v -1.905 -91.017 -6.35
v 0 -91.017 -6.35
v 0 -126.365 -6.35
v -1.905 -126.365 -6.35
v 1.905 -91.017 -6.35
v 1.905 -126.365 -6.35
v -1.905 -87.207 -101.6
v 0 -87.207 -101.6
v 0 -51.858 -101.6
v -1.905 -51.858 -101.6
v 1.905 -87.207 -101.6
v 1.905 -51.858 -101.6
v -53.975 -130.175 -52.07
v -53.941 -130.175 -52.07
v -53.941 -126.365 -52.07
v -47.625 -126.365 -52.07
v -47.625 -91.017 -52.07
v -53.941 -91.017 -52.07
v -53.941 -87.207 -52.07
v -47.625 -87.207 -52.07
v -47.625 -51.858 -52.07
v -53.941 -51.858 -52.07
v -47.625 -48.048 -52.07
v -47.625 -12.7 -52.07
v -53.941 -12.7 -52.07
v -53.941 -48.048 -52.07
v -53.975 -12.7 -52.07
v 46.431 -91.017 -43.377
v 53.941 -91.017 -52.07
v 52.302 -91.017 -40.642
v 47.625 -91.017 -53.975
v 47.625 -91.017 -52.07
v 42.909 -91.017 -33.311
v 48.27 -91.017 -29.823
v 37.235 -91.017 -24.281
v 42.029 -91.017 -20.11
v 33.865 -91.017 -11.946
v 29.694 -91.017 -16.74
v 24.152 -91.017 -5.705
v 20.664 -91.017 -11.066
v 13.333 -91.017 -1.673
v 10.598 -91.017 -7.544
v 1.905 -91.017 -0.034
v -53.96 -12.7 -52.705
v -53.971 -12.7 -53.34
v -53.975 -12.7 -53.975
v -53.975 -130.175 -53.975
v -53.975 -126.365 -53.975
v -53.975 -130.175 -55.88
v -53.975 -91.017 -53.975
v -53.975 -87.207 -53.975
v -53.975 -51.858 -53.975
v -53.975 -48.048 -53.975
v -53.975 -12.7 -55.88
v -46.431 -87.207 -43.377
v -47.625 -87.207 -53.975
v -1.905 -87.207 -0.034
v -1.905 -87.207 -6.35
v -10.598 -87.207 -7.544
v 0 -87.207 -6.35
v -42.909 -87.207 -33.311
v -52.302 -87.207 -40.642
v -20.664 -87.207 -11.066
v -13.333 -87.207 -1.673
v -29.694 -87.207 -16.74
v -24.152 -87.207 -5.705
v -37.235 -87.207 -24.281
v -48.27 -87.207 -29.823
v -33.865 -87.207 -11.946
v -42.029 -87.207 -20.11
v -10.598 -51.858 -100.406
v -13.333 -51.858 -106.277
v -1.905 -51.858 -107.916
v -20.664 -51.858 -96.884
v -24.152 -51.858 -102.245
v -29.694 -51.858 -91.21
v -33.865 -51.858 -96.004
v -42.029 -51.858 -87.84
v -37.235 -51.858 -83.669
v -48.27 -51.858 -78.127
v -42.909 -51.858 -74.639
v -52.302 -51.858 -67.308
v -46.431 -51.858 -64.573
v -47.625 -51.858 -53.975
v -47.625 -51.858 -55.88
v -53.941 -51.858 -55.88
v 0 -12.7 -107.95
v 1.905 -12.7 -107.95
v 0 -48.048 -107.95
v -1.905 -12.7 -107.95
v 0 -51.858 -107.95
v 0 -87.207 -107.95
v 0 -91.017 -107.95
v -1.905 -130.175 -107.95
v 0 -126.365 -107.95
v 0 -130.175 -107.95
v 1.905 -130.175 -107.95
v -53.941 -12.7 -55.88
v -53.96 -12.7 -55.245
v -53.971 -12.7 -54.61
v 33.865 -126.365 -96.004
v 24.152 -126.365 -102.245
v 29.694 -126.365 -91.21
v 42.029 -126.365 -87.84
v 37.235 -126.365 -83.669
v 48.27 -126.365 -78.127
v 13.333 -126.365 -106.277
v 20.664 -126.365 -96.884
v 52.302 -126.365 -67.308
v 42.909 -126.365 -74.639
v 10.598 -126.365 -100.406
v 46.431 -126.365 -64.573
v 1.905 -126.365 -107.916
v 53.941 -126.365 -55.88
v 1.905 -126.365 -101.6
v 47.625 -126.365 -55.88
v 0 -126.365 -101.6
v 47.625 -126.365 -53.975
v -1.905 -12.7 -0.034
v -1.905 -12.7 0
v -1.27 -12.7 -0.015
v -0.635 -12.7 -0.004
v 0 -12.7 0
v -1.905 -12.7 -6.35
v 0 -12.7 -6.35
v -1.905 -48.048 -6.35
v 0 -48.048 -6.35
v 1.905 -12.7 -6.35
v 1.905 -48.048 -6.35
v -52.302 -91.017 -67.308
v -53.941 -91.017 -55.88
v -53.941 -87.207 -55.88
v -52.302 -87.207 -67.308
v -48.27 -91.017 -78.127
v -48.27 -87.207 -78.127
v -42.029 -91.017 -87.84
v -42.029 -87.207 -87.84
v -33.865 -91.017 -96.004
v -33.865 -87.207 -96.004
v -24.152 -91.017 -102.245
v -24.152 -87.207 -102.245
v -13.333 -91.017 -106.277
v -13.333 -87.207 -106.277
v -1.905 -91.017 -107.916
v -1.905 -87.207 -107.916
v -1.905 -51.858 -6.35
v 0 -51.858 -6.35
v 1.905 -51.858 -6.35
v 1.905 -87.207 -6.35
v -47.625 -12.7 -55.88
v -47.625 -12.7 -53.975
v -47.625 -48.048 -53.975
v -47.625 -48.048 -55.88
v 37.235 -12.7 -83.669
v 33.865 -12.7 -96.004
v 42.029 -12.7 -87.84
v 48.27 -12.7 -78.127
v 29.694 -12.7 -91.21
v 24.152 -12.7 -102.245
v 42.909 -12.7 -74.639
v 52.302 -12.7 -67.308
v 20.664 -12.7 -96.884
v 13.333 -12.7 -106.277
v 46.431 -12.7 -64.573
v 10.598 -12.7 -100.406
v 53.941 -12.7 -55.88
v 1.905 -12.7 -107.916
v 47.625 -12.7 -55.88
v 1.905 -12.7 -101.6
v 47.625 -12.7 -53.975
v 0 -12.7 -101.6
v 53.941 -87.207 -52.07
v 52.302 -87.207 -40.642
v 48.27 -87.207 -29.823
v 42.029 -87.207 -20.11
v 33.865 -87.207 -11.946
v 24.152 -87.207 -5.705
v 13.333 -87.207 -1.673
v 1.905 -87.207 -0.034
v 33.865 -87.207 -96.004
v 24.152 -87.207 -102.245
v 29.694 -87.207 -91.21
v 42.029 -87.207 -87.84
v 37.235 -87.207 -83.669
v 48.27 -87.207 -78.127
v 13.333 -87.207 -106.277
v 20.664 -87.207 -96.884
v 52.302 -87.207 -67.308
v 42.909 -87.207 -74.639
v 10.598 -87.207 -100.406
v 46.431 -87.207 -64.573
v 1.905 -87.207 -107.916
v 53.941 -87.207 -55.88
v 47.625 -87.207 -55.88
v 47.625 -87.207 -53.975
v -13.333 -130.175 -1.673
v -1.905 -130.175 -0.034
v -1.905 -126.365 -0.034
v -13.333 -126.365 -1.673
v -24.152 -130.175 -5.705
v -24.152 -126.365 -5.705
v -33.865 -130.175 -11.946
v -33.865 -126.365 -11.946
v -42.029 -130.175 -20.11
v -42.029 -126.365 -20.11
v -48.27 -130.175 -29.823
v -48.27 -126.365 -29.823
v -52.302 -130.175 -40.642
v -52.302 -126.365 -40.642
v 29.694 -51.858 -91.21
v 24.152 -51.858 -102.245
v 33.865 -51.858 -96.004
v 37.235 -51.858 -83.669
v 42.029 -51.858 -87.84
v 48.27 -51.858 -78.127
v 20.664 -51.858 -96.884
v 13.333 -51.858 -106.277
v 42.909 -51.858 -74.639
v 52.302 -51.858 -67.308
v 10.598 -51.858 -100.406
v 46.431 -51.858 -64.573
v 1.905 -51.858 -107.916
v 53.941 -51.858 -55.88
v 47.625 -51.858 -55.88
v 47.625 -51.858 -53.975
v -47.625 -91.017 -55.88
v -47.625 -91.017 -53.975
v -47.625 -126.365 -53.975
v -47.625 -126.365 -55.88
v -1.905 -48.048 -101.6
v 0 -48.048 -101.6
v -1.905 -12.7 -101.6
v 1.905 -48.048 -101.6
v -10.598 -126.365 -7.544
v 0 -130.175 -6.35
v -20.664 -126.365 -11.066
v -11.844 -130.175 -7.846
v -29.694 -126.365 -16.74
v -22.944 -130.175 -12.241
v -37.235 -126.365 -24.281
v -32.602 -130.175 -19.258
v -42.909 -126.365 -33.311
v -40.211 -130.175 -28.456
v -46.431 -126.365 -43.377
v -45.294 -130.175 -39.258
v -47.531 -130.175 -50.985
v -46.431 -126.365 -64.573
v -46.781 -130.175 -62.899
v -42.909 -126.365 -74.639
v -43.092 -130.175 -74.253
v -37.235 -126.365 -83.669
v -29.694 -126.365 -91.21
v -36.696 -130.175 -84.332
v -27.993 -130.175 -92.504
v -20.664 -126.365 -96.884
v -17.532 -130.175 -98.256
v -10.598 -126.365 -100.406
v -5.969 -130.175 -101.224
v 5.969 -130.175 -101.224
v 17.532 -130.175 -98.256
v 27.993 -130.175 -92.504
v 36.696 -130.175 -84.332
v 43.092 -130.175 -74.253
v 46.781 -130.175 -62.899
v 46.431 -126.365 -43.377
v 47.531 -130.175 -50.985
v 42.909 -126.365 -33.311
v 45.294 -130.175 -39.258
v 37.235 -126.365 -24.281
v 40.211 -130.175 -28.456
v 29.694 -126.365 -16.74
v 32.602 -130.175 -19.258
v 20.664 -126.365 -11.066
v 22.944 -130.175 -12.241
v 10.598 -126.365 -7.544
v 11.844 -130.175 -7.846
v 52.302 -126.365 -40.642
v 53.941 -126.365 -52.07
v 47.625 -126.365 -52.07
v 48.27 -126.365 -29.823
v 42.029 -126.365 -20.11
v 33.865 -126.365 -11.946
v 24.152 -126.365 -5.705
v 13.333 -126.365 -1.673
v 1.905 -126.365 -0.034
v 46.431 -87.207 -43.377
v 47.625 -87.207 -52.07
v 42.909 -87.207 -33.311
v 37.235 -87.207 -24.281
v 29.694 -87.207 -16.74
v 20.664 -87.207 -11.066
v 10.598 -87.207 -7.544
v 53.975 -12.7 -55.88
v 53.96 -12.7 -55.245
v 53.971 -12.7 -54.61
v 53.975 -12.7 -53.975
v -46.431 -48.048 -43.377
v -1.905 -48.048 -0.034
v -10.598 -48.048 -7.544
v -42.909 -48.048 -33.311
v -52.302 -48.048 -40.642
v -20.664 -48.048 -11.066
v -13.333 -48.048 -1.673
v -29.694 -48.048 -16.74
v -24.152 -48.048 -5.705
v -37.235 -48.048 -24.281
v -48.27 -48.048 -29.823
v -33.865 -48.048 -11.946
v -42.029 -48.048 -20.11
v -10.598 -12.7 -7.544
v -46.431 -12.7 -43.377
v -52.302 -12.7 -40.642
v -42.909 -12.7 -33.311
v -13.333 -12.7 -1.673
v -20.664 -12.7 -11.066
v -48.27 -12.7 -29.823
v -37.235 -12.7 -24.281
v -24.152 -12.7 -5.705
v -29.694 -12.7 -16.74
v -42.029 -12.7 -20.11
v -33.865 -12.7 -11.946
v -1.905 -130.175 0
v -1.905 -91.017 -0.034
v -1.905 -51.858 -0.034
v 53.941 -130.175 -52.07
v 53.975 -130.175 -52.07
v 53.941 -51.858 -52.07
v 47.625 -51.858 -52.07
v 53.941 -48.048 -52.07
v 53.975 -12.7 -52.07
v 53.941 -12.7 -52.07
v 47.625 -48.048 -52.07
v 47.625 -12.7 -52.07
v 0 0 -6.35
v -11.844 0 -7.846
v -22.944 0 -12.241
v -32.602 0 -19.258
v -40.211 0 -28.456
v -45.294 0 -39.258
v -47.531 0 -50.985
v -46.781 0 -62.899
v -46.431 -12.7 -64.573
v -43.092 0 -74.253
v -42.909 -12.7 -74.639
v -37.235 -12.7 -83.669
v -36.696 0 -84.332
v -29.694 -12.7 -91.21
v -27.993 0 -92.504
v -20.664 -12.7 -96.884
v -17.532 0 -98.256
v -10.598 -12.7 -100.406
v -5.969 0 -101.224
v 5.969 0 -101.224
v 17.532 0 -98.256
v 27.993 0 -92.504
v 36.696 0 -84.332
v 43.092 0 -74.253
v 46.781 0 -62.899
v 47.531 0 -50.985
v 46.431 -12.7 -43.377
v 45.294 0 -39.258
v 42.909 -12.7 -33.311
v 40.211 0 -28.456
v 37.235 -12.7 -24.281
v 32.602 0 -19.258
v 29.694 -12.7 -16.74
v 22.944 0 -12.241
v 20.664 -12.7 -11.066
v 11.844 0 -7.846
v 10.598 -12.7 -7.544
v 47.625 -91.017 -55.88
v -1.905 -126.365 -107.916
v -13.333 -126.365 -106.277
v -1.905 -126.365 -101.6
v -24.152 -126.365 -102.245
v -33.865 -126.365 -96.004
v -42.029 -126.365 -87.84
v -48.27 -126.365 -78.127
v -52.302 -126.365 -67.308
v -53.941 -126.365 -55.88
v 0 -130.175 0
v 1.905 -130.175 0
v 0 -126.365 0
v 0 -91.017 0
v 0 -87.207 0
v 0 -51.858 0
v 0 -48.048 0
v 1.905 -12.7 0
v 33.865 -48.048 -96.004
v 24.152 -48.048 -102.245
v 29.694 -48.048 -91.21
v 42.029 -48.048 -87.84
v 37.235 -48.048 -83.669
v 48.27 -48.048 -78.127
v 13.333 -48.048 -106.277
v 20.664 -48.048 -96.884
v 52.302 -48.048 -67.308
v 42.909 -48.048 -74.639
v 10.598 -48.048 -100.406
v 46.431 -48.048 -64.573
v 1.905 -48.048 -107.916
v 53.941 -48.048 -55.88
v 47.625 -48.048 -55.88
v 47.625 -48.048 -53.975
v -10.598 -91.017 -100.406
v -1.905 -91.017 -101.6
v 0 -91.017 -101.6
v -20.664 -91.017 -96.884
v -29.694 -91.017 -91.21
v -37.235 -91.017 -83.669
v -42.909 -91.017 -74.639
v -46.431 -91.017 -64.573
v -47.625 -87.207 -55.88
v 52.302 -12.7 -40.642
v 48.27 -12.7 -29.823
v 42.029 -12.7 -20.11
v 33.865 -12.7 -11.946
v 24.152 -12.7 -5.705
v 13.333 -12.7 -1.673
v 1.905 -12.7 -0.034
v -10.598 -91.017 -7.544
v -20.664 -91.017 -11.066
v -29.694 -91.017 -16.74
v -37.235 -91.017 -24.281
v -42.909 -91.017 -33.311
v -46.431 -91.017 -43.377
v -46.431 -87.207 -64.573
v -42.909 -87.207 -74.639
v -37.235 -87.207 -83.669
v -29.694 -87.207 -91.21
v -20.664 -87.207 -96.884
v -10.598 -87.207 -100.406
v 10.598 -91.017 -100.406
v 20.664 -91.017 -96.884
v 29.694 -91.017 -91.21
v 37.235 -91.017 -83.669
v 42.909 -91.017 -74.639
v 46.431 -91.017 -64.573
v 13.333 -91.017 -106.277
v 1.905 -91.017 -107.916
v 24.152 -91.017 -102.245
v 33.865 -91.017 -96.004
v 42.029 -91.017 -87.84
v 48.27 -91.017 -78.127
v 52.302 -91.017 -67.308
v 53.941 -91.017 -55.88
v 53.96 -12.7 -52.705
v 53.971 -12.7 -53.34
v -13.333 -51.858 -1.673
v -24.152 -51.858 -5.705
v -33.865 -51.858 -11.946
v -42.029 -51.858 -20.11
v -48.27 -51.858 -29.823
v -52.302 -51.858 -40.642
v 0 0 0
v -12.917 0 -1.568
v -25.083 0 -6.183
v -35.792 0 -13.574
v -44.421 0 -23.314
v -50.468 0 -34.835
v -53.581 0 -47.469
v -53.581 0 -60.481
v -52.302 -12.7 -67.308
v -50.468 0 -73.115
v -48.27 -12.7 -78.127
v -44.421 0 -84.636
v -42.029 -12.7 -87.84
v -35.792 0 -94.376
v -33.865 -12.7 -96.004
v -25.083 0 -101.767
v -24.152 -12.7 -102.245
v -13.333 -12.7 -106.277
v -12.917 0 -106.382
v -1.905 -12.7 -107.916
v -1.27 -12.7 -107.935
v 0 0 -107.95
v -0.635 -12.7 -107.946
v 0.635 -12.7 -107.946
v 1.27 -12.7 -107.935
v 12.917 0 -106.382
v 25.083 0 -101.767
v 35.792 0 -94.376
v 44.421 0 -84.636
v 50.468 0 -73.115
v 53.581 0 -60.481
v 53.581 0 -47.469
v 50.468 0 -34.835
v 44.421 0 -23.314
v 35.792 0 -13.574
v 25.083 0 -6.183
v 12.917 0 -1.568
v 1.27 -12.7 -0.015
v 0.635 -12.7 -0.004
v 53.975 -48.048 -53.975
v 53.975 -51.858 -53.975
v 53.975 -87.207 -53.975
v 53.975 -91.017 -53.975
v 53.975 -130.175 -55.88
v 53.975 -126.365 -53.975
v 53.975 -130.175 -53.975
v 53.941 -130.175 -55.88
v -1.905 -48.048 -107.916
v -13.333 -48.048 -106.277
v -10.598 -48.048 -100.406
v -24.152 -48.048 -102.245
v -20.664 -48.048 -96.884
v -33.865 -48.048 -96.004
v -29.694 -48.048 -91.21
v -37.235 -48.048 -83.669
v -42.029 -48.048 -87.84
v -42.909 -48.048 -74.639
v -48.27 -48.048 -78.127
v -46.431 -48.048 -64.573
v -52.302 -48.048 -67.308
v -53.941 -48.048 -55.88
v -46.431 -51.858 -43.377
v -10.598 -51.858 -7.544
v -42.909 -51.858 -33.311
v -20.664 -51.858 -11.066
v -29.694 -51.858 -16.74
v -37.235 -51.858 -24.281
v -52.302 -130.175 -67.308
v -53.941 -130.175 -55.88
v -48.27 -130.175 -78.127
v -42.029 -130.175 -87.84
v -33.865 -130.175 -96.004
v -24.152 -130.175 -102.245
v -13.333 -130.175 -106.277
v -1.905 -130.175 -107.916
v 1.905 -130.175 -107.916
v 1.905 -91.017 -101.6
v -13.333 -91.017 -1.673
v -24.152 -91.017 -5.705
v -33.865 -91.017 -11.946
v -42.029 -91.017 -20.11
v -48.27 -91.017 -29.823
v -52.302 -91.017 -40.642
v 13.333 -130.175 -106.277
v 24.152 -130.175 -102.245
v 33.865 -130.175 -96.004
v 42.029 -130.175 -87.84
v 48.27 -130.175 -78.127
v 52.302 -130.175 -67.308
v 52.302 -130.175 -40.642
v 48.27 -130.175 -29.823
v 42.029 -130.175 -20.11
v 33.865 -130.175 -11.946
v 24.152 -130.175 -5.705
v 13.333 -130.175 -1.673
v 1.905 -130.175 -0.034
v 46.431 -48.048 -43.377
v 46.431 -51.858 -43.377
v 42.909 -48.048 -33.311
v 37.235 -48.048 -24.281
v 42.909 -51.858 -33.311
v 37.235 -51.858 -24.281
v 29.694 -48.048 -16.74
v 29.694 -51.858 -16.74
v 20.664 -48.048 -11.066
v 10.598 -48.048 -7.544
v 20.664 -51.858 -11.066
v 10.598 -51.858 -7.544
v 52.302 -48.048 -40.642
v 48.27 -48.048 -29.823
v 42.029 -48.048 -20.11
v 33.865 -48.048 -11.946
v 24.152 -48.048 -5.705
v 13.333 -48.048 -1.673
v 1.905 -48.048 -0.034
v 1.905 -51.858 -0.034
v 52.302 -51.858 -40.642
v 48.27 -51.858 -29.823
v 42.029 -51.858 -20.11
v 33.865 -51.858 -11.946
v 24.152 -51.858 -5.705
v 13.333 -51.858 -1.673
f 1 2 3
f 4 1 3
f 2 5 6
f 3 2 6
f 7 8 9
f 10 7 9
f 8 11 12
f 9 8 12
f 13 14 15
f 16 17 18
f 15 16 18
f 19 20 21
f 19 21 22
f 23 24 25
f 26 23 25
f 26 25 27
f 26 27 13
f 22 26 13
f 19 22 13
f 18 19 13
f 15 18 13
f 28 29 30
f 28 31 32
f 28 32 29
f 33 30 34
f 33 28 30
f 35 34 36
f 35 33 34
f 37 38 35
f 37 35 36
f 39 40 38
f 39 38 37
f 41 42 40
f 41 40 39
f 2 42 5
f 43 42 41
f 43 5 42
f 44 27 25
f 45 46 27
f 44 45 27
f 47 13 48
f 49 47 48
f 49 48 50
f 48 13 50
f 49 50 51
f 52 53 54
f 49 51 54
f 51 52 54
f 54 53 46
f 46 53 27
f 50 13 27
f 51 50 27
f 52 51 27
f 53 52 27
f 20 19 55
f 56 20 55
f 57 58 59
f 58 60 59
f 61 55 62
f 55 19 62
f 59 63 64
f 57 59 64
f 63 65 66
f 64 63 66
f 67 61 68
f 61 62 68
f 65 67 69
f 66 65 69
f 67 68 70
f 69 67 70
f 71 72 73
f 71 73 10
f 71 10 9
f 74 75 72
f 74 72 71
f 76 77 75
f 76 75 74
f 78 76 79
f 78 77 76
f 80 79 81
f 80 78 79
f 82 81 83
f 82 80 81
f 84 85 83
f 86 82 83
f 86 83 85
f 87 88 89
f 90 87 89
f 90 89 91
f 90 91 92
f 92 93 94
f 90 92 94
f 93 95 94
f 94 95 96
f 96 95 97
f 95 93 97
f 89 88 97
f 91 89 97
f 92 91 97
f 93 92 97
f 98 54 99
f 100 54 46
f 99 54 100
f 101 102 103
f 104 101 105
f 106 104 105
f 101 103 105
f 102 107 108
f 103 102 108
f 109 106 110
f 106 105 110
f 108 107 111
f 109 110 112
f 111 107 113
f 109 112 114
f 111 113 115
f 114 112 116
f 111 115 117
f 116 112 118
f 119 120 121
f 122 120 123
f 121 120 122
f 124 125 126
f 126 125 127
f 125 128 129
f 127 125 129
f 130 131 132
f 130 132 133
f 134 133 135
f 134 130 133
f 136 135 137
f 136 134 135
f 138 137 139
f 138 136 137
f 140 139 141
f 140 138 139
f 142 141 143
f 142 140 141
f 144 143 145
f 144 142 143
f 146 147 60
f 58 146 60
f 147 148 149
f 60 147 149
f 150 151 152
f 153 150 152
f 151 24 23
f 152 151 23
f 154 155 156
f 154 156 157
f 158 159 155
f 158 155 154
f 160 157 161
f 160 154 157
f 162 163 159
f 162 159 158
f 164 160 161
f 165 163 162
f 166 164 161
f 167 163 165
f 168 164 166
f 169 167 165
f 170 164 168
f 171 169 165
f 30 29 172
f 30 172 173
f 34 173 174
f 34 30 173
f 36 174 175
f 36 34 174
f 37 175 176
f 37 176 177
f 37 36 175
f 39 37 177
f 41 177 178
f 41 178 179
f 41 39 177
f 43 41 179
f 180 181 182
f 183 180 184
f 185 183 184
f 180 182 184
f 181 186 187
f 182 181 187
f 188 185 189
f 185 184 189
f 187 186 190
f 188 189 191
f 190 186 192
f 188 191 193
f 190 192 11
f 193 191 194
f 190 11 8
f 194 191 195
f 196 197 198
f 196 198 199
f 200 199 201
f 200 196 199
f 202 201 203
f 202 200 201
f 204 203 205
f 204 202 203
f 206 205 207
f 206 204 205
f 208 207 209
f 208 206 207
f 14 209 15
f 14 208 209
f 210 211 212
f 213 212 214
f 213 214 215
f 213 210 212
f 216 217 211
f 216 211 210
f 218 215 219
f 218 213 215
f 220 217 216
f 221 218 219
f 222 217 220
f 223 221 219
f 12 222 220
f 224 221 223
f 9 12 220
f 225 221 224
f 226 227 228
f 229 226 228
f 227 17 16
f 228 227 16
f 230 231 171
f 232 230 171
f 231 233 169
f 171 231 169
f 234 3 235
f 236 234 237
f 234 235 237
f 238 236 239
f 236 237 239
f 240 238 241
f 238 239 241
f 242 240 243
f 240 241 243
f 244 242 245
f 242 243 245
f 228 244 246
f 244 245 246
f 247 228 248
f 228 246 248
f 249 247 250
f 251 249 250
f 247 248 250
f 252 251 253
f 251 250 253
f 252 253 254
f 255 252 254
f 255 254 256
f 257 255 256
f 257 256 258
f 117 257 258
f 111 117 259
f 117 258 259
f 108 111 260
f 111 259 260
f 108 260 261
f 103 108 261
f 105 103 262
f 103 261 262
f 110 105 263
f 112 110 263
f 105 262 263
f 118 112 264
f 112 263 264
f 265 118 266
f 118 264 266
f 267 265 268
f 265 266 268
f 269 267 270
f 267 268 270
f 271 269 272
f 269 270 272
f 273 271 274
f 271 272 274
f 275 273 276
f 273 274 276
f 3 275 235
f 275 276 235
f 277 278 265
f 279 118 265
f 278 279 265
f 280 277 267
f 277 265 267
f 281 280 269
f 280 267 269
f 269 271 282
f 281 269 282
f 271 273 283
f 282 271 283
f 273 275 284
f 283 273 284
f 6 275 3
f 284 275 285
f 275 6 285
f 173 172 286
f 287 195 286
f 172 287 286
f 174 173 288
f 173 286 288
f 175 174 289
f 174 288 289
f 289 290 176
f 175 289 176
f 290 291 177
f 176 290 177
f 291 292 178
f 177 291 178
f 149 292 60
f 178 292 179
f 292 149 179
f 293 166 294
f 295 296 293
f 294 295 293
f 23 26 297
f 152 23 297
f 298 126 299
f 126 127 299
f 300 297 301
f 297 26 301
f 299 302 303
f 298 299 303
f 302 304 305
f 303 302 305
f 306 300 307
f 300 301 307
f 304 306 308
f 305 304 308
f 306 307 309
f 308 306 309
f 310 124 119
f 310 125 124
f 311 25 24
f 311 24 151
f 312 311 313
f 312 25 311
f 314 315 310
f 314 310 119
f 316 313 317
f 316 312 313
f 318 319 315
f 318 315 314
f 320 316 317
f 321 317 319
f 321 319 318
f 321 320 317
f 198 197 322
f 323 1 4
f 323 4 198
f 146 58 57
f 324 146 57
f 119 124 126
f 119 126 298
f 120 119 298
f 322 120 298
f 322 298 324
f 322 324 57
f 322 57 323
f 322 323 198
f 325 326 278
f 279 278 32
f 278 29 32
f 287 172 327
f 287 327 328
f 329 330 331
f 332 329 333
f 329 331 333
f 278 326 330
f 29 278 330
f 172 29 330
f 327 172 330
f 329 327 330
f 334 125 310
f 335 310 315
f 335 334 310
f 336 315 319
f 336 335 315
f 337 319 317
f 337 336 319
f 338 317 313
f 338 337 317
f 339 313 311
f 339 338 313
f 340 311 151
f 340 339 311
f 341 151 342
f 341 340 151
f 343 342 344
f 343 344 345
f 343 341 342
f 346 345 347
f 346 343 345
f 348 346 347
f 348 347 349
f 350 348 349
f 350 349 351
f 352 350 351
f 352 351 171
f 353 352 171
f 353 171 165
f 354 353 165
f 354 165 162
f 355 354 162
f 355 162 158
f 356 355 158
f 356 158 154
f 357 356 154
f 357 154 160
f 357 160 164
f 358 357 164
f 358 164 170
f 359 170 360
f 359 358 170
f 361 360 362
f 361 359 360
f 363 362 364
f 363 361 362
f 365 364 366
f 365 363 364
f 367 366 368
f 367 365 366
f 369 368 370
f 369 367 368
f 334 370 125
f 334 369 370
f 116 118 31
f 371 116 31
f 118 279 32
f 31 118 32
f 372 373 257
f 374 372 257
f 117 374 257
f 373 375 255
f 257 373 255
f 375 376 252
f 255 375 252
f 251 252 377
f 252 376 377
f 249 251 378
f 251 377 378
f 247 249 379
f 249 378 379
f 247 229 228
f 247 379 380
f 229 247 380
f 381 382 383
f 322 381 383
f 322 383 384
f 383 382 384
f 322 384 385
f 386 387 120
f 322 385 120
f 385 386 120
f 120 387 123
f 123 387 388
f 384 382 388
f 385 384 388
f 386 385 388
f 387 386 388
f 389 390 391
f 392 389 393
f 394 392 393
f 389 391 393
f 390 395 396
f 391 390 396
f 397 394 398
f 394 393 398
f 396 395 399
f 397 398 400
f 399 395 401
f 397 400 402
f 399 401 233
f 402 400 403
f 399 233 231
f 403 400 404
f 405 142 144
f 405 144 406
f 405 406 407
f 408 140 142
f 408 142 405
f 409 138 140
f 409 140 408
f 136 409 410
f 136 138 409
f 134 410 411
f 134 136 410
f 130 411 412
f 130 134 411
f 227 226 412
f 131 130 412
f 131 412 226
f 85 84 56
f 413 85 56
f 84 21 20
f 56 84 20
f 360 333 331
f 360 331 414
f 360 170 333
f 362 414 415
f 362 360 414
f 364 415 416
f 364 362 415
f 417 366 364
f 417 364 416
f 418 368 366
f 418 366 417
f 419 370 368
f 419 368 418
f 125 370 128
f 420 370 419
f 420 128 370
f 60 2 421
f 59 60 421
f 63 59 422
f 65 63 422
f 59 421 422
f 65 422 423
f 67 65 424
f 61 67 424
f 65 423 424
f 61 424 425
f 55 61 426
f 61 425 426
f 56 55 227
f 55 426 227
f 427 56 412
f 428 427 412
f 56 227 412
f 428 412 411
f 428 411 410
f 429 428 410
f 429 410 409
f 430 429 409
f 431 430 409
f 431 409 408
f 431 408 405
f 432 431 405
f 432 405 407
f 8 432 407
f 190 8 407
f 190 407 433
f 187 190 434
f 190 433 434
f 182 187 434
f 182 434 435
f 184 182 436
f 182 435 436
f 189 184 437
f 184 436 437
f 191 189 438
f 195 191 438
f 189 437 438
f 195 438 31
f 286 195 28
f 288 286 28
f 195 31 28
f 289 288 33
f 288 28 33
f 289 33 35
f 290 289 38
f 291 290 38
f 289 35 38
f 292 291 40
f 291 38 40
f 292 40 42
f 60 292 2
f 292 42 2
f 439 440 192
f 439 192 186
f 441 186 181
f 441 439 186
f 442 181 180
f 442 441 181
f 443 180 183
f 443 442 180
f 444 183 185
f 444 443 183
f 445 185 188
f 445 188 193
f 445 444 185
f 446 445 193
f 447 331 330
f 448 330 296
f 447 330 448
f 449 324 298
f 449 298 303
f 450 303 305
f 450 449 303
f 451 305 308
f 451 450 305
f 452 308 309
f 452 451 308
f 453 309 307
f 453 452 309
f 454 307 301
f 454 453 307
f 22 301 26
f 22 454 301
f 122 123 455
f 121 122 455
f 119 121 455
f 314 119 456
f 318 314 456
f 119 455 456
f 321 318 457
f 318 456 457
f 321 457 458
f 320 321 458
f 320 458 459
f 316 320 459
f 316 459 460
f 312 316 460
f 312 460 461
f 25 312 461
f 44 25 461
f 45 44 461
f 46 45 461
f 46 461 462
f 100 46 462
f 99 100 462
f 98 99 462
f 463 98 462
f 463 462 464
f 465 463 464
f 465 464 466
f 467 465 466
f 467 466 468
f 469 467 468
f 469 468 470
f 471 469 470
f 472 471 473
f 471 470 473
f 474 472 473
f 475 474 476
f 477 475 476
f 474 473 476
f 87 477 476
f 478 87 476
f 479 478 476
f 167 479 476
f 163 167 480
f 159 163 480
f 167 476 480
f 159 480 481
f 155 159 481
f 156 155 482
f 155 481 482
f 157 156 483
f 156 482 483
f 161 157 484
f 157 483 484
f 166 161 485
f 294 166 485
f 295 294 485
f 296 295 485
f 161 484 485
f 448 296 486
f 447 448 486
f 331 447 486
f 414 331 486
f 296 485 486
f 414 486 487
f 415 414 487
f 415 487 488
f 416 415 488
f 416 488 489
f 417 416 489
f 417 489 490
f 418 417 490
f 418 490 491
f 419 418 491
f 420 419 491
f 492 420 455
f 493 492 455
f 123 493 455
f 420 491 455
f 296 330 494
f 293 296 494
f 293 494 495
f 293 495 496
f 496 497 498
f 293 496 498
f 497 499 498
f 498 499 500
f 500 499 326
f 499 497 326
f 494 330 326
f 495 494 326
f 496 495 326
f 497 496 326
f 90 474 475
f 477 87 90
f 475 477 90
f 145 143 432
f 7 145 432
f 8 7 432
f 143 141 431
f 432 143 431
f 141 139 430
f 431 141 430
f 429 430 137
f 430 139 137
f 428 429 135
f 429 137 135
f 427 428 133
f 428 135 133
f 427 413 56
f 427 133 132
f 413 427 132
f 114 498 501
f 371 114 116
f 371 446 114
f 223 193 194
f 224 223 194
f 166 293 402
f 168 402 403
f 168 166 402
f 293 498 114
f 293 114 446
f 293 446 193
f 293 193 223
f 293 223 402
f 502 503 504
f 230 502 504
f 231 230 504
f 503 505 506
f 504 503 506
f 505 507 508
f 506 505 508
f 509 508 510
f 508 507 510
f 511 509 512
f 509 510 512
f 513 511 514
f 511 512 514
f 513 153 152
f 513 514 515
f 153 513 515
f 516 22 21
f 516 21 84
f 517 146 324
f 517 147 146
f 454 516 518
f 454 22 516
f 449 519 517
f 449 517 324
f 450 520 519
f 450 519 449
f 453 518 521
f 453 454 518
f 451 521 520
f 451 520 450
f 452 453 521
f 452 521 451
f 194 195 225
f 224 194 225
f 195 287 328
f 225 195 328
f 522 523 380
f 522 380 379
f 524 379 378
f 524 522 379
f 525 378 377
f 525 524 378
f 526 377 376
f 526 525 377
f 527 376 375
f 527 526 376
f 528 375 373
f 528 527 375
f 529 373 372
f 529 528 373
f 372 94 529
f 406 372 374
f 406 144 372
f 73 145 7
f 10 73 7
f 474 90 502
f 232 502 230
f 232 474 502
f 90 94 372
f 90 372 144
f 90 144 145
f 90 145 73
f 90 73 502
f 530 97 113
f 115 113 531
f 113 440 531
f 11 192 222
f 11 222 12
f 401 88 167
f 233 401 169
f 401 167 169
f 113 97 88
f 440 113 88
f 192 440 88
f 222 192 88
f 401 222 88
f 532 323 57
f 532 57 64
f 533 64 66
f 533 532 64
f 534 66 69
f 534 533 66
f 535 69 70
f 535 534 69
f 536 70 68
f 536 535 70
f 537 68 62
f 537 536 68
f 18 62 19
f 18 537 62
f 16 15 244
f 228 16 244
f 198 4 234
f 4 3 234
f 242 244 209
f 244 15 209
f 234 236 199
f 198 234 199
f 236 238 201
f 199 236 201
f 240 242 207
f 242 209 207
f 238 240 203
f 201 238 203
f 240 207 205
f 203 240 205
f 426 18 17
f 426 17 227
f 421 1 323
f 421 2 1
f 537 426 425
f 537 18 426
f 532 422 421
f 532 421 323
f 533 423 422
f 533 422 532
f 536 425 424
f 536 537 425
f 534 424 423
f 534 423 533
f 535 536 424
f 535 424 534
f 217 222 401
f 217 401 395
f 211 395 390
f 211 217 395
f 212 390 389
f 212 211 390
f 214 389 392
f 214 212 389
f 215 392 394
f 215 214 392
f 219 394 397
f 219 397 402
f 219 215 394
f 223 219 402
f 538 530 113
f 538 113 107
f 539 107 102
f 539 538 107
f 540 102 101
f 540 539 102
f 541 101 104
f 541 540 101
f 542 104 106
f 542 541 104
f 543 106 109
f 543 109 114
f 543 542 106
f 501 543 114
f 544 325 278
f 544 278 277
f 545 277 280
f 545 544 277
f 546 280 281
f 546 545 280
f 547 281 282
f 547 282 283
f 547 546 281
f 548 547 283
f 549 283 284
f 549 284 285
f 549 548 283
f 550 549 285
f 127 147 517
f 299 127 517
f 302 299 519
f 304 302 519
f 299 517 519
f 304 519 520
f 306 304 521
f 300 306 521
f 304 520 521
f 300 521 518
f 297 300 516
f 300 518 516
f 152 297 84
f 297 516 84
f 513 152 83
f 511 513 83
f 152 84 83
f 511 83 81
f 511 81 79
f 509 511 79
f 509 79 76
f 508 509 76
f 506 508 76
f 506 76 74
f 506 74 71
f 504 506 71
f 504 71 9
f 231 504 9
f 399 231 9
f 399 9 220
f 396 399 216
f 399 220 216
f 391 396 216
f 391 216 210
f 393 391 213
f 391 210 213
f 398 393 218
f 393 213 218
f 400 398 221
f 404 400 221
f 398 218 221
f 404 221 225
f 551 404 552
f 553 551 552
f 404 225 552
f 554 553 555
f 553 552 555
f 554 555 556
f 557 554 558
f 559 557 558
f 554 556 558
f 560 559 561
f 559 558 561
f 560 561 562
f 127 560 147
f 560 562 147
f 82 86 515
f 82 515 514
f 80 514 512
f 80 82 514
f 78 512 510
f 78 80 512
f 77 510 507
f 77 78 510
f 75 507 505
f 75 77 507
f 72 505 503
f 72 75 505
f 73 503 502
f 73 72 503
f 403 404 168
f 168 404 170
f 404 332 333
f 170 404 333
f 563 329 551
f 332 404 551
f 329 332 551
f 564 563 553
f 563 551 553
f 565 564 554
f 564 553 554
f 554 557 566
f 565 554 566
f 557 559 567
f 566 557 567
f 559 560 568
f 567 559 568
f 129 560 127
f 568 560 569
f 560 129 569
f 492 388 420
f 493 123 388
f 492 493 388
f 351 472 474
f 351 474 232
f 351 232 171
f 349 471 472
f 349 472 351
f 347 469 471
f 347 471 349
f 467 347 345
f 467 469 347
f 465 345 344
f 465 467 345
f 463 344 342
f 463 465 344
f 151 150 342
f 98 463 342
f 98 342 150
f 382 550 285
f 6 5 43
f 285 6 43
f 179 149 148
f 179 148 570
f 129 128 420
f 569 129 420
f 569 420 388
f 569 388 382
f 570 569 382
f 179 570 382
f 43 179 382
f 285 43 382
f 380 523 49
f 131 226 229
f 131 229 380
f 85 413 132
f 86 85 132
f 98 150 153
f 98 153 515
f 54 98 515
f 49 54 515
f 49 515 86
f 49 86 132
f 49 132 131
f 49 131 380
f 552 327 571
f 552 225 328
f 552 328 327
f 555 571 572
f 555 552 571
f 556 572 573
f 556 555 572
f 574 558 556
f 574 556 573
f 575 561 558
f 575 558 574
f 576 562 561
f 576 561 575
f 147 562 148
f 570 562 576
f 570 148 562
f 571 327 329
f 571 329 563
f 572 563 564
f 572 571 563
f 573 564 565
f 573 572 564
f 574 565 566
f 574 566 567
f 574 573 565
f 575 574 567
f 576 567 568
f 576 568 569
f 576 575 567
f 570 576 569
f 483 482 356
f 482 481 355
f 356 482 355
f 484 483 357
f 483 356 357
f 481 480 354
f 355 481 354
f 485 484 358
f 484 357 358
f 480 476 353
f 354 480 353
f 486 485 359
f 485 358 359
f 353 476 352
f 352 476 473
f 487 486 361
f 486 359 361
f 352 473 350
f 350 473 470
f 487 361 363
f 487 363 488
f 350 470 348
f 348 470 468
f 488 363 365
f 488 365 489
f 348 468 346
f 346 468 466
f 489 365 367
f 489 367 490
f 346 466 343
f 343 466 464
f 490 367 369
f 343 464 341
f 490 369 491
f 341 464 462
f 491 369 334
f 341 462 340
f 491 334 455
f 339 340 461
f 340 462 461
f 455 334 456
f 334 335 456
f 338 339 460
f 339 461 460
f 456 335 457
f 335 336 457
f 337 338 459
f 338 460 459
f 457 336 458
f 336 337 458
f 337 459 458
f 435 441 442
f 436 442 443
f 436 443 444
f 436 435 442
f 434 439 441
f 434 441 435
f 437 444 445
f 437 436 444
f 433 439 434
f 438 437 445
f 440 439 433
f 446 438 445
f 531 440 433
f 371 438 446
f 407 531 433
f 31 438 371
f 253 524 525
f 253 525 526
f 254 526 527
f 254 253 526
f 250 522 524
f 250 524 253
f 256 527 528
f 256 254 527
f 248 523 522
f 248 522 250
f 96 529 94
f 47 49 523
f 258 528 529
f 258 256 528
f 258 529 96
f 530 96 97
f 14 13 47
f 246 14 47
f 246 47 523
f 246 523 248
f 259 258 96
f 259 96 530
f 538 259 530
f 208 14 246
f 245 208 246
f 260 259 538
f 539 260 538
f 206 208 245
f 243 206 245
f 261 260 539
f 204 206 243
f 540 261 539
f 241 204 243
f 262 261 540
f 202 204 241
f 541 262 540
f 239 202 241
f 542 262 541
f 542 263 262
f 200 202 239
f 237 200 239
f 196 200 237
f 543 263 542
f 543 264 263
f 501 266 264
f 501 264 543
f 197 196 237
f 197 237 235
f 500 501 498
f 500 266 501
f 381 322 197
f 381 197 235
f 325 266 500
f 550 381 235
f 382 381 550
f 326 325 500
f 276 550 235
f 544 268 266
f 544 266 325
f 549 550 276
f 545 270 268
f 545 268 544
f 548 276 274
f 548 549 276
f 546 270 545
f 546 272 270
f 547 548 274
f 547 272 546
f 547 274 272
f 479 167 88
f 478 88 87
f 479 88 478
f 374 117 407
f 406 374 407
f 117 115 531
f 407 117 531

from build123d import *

# Parameters (mm, degrees)
SKETCH1_W           = 6.35
SKETCH1_H           = 12.7
BOSS_EXTRUDE1_DEPTH = 1.905
CIRPATTERN1_COUNT   = 2
CIRPATTERN1_ANGLE   = 90
SKETCH2_R           = 53.975
SKETCH2_R_2         = 47.625
BOSS_EXTRUDE2_DEPTH = 3.81
LPATTERN1_COUNT     = 3
LPATTERN1_PITCH     = 39.15833418
SKETCH4_R           = 60.96
CUT_EXTRUDE1_DEPTH  = 66.04


with BuildPart() as part:
    # Sketch1 → Revolve6 (revolve)
    with BuildSketch(Plane(origin=(0, 0, 0), x_dir=(0, 0, -1), z_dir=(1, 0, 0))):
        with Locations((3.175, -6.35)):
            Rectangle(SKETCH1_W, SKETCH1_H)
    revolve(axis=Axis((0, -130.175, -53.975), (0, -1, 0)))

    # Sketch1<6> → Boss-Extrude1 (add, symmetric)
    with BuildSketch(Plane(origin=(0, 0, 0), x_dir=(0, 0, -1), z_dir=(1, 0, 0))):
        with BuildLine():
            Line((6.35, -12.7), (0, -12.7))
            Line((0, -12.7), (0, -130.175))
            ThreePointArc((0, -130.175), (53.975, -184.15), (107.95, -130.175))
            Line((107.95, -130.175), (107.95, -12.7))
            Line((107.95, -12.7), (101.6, -12.7))
            Line((101.6, -12.7), (101.6, -130.175))
            ThreePointArc((101.6, -130.175), (53.975, -177.8), (6.35, -130.175))
            Line((6.35, -130.175), (6.35, -12.7))
        make_face()
    boss_extrude1 = extrude(amount=BOSS_EXTRUDE1_DEPTH, both=True)

    # CirPattern1: Boss-Extrude1 ×2 about axis
    cirpattern1_axis = Axis((0, -130.175, -53.975), (0, -1, 0))
    for i in range(1, CIRPATTERN1_COUNT):
        add(boss_extrude1.rotate(cirpattern1_axis, i * CIRPATTERN1_ANGLE / (CIRPATTERN1_COUNT - 1)))

    # Sketch2 → Boss-Extrude2 (add)
    with BuildSketch(Plane(origin=(0, -130.175, 0), x_dir=(-1, 0, 0), z_dir=(0, -1, 0))):
        with Locations((0, 53.975)):
            Circle(SKETCH2_R)
        with Locations((0, 53.975)):
            Circle(SKETCH2_R_2, mode=Mode.SUBTRACT)
    boss_extrude2 = extrude(amount=-BOSS_EXTRUDE2_DEPTH)

    # LPattern1: Boss-Extrude2 ×3
    with Locations(*[(0, i * LPATTERN1_PITCH, 0) for i in range(1, LPATTERN1_COUNT)]):
        add(boss_extrude2)

    # Sketch4 → Cut-Extrude1 (cut)
    with BuildSketch(Plane.XZ.offset(130.175)):
        with Locations((0, -53.975)):
            Circle(SKETCH4_R)
    extrude(amount=CUT_EXTRUDE1_DEPTH, mode=Mode.SUBTRACT)


solid = part.part
